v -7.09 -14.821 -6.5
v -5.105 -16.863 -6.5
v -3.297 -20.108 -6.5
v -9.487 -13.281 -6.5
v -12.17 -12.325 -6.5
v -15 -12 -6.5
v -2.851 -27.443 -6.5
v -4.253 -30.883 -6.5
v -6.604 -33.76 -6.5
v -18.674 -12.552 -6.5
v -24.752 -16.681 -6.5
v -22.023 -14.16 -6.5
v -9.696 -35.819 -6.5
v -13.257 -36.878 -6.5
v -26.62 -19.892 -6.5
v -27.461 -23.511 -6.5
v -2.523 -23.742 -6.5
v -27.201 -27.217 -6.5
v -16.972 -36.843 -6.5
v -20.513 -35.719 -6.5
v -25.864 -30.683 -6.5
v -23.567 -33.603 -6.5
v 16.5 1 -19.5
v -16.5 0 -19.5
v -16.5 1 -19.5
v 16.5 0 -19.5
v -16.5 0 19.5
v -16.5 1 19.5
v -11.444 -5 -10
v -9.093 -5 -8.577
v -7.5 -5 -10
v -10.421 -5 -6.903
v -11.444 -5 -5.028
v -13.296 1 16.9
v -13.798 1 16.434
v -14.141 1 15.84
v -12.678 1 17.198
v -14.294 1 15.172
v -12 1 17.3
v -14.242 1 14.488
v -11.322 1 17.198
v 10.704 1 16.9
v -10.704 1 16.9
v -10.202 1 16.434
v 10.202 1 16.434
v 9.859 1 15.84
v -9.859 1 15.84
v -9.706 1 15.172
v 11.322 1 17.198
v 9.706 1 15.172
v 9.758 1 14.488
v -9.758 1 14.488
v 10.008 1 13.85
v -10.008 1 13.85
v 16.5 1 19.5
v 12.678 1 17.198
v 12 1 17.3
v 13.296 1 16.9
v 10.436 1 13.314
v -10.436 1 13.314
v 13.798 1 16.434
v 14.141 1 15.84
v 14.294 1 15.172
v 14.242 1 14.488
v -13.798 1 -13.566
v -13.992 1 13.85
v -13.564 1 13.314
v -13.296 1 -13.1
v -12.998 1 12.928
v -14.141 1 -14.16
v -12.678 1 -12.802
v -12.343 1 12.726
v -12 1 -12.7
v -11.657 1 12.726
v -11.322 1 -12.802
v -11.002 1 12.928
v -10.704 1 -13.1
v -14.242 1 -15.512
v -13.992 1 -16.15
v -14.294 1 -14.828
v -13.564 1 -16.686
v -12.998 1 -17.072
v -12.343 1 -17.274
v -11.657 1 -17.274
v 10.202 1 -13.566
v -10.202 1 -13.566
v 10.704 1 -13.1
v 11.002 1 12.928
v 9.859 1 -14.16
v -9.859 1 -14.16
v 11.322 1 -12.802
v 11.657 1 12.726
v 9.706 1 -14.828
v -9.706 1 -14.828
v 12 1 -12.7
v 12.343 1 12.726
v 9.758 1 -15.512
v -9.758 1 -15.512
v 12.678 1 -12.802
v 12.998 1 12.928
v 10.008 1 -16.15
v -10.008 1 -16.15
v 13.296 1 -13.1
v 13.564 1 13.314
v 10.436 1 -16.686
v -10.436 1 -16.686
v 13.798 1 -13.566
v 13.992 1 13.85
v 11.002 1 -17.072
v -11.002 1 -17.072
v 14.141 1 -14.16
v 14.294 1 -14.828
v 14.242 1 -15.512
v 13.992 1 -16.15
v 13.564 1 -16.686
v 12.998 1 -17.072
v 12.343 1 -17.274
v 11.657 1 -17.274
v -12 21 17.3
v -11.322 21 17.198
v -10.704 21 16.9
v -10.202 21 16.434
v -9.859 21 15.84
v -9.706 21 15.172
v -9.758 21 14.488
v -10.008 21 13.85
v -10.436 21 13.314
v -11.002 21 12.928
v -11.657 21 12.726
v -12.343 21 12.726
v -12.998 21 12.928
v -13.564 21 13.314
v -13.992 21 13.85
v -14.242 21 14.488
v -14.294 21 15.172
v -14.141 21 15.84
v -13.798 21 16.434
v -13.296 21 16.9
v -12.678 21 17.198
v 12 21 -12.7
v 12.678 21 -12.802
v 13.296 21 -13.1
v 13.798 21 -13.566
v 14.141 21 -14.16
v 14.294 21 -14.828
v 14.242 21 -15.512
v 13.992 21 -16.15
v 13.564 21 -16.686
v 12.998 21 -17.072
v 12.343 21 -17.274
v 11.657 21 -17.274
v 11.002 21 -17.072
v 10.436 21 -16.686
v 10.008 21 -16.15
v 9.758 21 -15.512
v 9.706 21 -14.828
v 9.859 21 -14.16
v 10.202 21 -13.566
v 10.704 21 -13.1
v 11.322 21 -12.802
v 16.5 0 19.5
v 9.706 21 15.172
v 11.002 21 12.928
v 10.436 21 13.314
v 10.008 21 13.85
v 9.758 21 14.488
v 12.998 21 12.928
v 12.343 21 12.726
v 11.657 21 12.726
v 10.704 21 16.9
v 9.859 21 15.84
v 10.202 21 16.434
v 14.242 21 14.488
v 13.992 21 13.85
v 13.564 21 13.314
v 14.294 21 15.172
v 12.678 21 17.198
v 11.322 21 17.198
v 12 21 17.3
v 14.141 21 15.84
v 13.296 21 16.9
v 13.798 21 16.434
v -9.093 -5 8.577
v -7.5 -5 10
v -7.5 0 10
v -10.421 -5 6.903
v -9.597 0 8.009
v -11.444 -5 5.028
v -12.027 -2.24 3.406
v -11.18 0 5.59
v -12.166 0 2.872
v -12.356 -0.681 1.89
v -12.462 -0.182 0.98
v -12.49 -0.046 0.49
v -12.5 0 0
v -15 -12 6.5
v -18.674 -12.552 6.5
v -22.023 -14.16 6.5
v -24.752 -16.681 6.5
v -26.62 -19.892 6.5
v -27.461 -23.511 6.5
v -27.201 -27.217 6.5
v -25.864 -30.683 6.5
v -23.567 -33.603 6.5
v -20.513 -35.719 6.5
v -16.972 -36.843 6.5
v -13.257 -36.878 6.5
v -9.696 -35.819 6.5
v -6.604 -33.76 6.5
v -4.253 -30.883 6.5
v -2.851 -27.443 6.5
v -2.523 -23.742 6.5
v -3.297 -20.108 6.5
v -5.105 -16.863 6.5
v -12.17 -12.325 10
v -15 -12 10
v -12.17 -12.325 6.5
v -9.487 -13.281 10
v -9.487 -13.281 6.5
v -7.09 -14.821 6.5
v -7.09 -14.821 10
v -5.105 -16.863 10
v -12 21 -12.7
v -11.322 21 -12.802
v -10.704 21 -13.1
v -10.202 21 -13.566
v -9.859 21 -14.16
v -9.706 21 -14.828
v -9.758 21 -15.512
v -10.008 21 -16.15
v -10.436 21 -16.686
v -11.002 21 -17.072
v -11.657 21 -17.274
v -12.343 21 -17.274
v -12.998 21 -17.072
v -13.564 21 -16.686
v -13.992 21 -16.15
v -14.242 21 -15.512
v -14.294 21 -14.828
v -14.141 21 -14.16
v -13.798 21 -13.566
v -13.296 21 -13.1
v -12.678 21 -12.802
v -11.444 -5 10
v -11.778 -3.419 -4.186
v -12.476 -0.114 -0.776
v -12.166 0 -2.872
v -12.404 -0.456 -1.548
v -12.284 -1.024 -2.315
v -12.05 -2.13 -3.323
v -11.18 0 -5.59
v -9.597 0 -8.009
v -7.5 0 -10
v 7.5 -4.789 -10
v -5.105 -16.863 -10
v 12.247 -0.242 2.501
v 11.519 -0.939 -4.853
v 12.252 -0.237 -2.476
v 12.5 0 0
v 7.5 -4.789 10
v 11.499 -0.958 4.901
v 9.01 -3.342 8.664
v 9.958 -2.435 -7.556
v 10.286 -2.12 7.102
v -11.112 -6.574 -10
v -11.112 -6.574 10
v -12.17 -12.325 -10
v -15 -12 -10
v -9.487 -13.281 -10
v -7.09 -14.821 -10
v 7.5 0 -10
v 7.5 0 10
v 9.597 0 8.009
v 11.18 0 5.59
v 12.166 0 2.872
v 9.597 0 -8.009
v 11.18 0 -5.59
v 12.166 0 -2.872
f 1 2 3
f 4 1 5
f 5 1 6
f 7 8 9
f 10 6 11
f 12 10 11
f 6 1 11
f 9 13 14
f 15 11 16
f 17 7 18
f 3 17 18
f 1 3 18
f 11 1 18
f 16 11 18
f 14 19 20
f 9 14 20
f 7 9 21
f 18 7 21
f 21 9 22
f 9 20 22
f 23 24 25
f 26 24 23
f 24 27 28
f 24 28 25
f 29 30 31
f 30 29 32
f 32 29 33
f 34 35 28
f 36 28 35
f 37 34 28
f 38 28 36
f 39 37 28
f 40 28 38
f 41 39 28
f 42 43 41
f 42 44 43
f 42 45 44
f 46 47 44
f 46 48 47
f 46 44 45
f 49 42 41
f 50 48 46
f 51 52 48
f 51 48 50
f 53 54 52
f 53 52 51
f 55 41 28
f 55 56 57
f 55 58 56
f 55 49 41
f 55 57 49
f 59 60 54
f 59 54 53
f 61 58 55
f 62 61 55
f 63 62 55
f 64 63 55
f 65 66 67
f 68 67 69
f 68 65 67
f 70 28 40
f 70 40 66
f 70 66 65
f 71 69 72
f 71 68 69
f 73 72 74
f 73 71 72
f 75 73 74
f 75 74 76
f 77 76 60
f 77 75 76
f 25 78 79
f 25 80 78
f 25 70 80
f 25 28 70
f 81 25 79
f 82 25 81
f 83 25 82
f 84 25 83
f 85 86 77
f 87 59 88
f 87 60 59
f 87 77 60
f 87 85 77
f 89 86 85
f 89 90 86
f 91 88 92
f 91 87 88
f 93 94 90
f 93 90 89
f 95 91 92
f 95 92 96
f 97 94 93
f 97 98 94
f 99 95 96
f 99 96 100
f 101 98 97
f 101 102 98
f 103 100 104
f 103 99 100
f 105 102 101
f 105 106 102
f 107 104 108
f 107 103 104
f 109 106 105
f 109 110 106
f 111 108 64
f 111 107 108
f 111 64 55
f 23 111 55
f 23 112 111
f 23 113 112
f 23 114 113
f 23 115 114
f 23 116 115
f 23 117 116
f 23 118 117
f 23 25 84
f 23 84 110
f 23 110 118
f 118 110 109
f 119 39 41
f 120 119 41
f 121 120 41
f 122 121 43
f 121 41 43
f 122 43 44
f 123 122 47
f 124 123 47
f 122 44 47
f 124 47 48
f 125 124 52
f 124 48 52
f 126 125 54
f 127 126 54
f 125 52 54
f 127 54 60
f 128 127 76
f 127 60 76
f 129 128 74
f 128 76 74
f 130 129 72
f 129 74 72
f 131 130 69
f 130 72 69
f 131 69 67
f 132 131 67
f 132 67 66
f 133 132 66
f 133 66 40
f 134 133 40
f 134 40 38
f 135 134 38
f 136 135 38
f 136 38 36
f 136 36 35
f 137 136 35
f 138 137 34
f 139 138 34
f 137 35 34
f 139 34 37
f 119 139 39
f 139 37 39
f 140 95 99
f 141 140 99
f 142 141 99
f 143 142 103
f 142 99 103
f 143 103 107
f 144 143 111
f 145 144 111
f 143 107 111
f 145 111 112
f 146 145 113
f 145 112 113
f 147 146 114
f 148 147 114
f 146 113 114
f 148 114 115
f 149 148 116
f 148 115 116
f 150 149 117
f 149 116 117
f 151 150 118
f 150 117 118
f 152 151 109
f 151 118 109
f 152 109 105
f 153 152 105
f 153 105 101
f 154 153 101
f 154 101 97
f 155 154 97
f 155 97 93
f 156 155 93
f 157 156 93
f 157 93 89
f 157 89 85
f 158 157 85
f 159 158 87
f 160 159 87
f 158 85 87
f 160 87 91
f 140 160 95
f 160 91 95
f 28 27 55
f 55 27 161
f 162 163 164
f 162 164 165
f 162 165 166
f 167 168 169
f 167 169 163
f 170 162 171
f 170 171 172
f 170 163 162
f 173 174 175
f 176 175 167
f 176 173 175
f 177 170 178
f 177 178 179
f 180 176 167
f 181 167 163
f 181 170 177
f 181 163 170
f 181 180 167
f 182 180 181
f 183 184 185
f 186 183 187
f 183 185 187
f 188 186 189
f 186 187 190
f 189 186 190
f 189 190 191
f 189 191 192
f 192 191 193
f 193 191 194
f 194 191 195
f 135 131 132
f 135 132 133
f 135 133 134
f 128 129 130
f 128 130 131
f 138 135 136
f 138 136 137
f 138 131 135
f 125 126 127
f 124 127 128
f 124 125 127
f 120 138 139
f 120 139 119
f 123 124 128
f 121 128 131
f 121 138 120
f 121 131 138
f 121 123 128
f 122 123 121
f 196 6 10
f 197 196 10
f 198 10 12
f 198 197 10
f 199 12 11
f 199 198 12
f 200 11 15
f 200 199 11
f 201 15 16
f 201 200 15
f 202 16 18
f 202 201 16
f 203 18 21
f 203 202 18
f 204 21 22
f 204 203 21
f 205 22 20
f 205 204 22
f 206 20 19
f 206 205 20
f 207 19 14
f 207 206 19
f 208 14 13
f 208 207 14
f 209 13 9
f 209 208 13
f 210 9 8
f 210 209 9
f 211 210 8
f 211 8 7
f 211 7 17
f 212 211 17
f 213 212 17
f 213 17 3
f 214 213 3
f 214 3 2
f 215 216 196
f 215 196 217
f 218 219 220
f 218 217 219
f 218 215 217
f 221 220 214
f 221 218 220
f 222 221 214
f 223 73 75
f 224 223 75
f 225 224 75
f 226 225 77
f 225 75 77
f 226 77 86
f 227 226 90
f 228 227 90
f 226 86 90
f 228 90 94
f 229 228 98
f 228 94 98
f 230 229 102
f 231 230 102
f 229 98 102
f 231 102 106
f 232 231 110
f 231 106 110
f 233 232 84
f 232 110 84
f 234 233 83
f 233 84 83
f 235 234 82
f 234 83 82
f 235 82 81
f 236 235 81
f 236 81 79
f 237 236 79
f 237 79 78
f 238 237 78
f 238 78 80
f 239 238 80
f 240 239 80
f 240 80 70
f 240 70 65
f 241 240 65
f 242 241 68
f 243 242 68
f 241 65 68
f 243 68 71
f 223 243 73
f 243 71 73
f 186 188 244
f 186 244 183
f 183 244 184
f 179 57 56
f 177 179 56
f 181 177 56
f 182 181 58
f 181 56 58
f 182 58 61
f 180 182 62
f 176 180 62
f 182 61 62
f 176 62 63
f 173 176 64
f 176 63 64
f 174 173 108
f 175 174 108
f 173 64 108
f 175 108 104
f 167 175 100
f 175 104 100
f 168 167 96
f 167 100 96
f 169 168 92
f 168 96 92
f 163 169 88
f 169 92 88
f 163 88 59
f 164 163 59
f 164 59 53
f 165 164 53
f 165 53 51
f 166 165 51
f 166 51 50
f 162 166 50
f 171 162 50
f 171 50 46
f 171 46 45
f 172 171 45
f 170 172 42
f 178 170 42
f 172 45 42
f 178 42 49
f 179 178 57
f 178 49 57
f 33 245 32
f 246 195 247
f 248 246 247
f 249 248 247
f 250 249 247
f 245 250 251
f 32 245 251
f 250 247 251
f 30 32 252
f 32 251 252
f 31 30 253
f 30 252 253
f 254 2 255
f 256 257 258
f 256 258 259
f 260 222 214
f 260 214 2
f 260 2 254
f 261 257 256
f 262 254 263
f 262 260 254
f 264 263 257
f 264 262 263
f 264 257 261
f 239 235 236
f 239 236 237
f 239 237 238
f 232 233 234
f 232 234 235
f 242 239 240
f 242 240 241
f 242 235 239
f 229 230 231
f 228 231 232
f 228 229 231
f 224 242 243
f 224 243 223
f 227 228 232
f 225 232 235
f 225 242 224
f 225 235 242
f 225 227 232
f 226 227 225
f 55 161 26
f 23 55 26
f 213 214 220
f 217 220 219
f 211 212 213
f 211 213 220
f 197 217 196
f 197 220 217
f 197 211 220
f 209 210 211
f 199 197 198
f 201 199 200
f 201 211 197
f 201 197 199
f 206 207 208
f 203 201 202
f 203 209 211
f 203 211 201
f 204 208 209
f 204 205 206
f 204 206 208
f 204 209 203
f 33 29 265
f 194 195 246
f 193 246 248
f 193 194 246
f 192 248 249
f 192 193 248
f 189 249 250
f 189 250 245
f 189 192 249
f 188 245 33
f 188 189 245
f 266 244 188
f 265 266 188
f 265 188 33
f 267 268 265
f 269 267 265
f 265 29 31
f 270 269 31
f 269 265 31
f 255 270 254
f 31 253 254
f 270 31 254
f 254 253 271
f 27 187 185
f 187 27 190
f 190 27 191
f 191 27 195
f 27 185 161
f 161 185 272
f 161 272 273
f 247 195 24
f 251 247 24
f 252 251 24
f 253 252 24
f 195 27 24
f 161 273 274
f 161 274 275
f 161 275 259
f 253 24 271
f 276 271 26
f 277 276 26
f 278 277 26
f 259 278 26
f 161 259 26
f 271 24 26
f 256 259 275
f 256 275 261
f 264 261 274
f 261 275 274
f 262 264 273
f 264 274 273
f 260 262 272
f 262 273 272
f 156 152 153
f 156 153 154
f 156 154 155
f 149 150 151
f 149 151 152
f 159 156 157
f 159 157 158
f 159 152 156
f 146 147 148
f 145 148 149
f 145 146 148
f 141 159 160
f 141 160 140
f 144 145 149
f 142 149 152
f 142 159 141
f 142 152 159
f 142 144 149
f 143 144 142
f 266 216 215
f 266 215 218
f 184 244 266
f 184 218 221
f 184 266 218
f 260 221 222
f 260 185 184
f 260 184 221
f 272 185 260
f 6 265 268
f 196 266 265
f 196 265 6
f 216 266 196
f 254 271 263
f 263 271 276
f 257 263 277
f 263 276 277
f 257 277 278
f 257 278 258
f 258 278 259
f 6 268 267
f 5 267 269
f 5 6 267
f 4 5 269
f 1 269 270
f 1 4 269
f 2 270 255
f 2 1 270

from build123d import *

# Parameters (mm, degrees)
SKETCH_1_W          = 33
SKETCH_1_H          = 39
EXTRUDE_1_DEPTH     = 1
SKETCH_2_R          = 12.5
EXTRUDE_2_DEPTH     = 6.5
EXTRUDE_3_DEPTH     = 10
SKETCH_4_R          = 2.3
EXTRUDE_4_DEPTH     = 20
SKETCH_5_OUTSIDE_W  = 62.518
SKETCH_5_OUTSIDE_H  = 57.518
SKETCH_5_OUTSIDE_R  = 12.5
CUT_EXTRUDE_1_DEPTH = 5


with BuildPart() as part:
    # 草图1 → 凸台-拉伸1 (new body)
    with BuildSketch(Plane(origin=(0, 0, 0), x_dir=(1, 0, 0), z_dir=(0, 1, 0))):
        Rectangle(SKETCH_1_W, SKETCH_1_H)
    extrude(amount=EXTRUDE_1_DEPTH)



with BuildPart() as body_2:
    # 草图2 → 凸台-拉伸2 (new, symmetric)
    with BuildSketch(Plane.XY):
        with Locations(Location((-15, -24.5, 0), (0, 0, 180))):
            Circle(SKETCH_2_R)
    extrude(amount=EXTRUDE_2_DEPTH, both=True)


with BuildPart() as part_1:
    add(part.part)

    add(body_2.part)  # 凸台-拉伸3 merges body 2
    # 草图3 → 凸台-拉伸3 (add, symmetric)
    with BuildSketch(Plane.XY):
        with BuildLine():
            Line((-12.5, 0), (-11.111866784, -6.574487566))
            Line((-11.111866784, -6.574487566), (-15, -12))
            ThreePointArc((-15, -12), (-9.487173184, -13.281321802), (-5.104539199, -16.86260152))
            Line((-5.104539199, -16.86260152), (12.5, 0))
            Line((12.5, 0), (-12.5, 0))
        make_face()
    extrude(amount=EXTRUDE_3_DEPTH, both=True)

    # 草图4 → 凸台-拉伸4 (add)
    with BuildSketch(Plane(origin=(0, 1, 0), x_dir=(1, 0, 0), z_dir=(0, 1, 0))):
        with Locations(Location((-12, 15, 0), (0, 0, 270))):
            Circle(SKETCH_4_R)
        with Locations(Location((12, 15, 0), (0, 0, 270))):
            Circle(SKETCH_4_R)
        with Locations(Location((-12, -15, 0), (0, 0, 270))):
            Circle(SKETCH_4_R)
        with Locations(Location((12, -15, 0), (0, 0, 270))):
            Circle(SKETCH_4_R)
    extrude(amount=EXTRUDE_4_DEPTH)

    # 草图5 outside → 切除-拉伸1 (cut)
    with BuildSketch(Plane.XZ):
        with Locations((-5.5, 0)):
            Rectangle(SKETCH_5_OUTSIDE_W, SKETCH_5_OUTSIDE_H)
        Circle(SKETCH_5_OUTSIDE_R, mode=Mode.SUBTRACT)
    extrude(amount=CUT_EXTRUDE_1_DEPTH, mode=Mode.SUBTRACT)


solid = part_1.part
